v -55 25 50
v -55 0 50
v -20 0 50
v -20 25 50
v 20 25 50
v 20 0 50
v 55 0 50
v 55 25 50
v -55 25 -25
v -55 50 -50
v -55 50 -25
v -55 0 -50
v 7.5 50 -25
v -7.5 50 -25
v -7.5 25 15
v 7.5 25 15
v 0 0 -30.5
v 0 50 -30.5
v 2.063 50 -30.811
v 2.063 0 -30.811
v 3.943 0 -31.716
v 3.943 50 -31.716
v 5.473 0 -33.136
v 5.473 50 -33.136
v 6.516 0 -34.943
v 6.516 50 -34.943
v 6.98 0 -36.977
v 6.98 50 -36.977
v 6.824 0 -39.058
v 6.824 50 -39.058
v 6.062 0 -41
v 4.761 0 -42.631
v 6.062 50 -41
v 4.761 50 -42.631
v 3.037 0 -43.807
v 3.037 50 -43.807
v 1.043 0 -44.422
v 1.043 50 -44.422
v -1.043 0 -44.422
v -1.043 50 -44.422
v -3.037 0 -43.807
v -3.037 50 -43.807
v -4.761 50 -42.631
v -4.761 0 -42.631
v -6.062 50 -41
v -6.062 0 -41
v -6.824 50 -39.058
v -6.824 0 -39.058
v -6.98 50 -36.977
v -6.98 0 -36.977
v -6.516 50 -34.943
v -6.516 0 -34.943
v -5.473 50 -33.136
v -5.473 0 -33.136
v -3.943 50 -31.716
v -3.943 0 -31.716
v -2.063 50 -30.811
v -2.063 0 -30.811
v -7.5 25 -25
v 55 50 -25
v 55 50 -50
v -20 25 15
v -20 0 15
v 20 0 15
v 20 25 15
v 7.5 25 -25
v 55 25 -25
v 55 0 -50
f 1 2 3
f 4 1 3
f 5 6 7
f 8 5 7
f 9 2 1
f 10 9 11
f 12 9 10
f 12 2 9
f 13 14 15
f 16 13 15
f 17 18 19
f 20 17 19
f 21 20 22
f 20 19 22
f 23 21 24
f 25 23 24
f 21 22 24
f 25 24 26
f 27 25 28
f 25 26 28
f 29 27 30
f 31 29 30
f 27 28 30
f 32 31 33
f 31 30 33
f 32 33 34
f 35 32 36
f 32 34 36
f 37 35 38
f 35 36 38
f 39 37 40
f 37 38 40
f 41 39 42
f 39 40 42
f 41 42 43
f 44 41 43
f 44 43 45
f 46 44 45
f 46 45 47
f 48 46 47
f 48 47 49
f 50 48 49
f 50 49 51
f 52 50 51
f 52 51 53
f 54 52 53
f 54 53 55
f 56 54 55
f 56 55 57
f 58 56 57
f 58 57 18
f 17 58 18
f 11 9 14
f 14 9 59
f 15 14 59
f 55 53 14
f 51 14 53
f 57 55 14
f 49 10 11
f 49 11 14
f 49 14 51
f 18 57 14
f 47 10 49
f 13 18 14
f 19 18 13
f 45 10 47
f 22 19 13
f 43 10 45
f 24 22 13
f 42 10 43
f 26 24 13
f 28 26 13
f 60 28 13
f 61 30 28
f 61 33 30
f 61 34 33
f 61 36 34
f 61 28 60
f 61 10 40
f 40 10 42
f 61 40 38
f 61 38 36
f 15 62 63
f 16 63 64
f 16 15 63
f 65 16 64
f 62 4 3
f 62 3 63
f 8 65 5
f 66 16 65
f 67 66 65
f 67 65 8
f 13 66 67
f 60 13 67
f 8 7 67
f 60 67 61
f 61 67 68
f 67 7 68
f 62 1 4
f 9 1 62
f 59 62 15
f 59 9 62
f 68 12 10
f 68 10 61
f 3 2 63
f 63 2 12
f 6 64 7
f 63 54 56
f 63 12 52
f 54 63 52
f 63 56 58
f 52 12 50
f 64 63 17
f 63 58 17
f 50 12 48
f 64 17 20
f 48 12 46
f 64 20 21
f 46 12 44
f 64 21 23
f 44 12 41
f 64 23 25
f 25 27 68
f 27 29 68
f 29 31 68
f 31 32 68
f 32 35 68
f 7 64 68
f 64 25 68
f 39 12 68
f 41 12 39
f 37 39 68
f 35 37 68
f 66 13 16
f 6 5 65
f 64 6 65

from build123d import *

# Parameters (mm, degrees)
SKETCH_1_W          = 110
SKETCH_1_H          = 100
EXTRUDE_1_DEPTH     = 25
SKETCH_2_W          = 110
SKETCH_2_H          = 25
EXTRUDE_2_DEPTH     = 25
SKETCH_3_W          = 40
SKETCH_3_H          = 35
CUT_EXTRUDE_1_DEPTH = 79.421935707
RIB_1_REACH         = 91.582
SKETCH_4_WALL_W     = 228.334634332
SKETCH_4_WALL_H     = 15
SKETCH_5_R          = 7
CUT_EXTRUDE_2_DEPTH = 90.582364336


with BuildPart() as part:
    # Эскиз1 → Бобышка-Вытянуть1 (new body)
    with BuildSketch(Plane(origin=(0, 0, 0), x_dir=(1, 0, 0), z_dir=(0, 1, 0))):
        Rectangle(SKETCH_1_W, SKETCH_1_H)
    extrude(amount=EXTRUDE_1_DEPTH)

    # Эскиз2 → Бобышка-Вытянуть2 (add)
    with BuildSketch(Plane(origin=(0, 25, 0), x_dir=(1, 0, 0), z_dir=(0, 1, 0))):
        with Locations((0, 37.5)):
            Rectangle(SKETCH_2_W, SKETCH_2_H)
    extrude(amount=EXTRUDE_2_DEPTH)

    # Эскиз3 → Вырез-Вытянуть1 (cut, through all)
    with BuildSketch(Plane(origin=(0, 25, 0), x_dir=(1, 0, 0), z_dir=(0, 1, 0))):
        with Locations((0, -32.5)):
            Rectangle(SKETCH_3_W, SKETCH_3_H)
    extrude(amount=-CUT_EXTRUDE_1_DEPTH, mode=Mode.SUBTRACT)

    # Эскиз4 wall → Ребро1 (add, up to next)
    with BuildSketch(Plane(origin=(0, 37.5, -5), x_dir=(0, -0.529998940003, 0.847998304005), z_dir=(0, -0.847998304005, -0.529998940003)), mode=Mode.PRIVATE) as rib_1_sk1:
        Rectangle(SKETCH_4_WALL_W, SKETCH_4_WALL_H)
    rib_1_tool1 = extrude(rib_1_sk1.sketch, amount=RIB_1_REACH, mode=Mode.PRIVATE) - part.part
    add(rib_1_tool1.solids().sort_by_distance((0, 37.5, -5))[0])

    # Эскиз5 → Вырез-Вытянуть2 (cut, through all)
    with BuildSketch(Plane(origin=(0, 50, 0), x_dir=(1, 0, 0), z_dir=(0, 1, 0))):
        with Locations(Location((0, 37.5, 0), (0, 0, 270))):
            Circle(SKETCH_5_R)
    extrude(amount=-CUT_EXTRUDE_2_DEPTH, mode=Mode.SUBTRACT)


solid = part.part
